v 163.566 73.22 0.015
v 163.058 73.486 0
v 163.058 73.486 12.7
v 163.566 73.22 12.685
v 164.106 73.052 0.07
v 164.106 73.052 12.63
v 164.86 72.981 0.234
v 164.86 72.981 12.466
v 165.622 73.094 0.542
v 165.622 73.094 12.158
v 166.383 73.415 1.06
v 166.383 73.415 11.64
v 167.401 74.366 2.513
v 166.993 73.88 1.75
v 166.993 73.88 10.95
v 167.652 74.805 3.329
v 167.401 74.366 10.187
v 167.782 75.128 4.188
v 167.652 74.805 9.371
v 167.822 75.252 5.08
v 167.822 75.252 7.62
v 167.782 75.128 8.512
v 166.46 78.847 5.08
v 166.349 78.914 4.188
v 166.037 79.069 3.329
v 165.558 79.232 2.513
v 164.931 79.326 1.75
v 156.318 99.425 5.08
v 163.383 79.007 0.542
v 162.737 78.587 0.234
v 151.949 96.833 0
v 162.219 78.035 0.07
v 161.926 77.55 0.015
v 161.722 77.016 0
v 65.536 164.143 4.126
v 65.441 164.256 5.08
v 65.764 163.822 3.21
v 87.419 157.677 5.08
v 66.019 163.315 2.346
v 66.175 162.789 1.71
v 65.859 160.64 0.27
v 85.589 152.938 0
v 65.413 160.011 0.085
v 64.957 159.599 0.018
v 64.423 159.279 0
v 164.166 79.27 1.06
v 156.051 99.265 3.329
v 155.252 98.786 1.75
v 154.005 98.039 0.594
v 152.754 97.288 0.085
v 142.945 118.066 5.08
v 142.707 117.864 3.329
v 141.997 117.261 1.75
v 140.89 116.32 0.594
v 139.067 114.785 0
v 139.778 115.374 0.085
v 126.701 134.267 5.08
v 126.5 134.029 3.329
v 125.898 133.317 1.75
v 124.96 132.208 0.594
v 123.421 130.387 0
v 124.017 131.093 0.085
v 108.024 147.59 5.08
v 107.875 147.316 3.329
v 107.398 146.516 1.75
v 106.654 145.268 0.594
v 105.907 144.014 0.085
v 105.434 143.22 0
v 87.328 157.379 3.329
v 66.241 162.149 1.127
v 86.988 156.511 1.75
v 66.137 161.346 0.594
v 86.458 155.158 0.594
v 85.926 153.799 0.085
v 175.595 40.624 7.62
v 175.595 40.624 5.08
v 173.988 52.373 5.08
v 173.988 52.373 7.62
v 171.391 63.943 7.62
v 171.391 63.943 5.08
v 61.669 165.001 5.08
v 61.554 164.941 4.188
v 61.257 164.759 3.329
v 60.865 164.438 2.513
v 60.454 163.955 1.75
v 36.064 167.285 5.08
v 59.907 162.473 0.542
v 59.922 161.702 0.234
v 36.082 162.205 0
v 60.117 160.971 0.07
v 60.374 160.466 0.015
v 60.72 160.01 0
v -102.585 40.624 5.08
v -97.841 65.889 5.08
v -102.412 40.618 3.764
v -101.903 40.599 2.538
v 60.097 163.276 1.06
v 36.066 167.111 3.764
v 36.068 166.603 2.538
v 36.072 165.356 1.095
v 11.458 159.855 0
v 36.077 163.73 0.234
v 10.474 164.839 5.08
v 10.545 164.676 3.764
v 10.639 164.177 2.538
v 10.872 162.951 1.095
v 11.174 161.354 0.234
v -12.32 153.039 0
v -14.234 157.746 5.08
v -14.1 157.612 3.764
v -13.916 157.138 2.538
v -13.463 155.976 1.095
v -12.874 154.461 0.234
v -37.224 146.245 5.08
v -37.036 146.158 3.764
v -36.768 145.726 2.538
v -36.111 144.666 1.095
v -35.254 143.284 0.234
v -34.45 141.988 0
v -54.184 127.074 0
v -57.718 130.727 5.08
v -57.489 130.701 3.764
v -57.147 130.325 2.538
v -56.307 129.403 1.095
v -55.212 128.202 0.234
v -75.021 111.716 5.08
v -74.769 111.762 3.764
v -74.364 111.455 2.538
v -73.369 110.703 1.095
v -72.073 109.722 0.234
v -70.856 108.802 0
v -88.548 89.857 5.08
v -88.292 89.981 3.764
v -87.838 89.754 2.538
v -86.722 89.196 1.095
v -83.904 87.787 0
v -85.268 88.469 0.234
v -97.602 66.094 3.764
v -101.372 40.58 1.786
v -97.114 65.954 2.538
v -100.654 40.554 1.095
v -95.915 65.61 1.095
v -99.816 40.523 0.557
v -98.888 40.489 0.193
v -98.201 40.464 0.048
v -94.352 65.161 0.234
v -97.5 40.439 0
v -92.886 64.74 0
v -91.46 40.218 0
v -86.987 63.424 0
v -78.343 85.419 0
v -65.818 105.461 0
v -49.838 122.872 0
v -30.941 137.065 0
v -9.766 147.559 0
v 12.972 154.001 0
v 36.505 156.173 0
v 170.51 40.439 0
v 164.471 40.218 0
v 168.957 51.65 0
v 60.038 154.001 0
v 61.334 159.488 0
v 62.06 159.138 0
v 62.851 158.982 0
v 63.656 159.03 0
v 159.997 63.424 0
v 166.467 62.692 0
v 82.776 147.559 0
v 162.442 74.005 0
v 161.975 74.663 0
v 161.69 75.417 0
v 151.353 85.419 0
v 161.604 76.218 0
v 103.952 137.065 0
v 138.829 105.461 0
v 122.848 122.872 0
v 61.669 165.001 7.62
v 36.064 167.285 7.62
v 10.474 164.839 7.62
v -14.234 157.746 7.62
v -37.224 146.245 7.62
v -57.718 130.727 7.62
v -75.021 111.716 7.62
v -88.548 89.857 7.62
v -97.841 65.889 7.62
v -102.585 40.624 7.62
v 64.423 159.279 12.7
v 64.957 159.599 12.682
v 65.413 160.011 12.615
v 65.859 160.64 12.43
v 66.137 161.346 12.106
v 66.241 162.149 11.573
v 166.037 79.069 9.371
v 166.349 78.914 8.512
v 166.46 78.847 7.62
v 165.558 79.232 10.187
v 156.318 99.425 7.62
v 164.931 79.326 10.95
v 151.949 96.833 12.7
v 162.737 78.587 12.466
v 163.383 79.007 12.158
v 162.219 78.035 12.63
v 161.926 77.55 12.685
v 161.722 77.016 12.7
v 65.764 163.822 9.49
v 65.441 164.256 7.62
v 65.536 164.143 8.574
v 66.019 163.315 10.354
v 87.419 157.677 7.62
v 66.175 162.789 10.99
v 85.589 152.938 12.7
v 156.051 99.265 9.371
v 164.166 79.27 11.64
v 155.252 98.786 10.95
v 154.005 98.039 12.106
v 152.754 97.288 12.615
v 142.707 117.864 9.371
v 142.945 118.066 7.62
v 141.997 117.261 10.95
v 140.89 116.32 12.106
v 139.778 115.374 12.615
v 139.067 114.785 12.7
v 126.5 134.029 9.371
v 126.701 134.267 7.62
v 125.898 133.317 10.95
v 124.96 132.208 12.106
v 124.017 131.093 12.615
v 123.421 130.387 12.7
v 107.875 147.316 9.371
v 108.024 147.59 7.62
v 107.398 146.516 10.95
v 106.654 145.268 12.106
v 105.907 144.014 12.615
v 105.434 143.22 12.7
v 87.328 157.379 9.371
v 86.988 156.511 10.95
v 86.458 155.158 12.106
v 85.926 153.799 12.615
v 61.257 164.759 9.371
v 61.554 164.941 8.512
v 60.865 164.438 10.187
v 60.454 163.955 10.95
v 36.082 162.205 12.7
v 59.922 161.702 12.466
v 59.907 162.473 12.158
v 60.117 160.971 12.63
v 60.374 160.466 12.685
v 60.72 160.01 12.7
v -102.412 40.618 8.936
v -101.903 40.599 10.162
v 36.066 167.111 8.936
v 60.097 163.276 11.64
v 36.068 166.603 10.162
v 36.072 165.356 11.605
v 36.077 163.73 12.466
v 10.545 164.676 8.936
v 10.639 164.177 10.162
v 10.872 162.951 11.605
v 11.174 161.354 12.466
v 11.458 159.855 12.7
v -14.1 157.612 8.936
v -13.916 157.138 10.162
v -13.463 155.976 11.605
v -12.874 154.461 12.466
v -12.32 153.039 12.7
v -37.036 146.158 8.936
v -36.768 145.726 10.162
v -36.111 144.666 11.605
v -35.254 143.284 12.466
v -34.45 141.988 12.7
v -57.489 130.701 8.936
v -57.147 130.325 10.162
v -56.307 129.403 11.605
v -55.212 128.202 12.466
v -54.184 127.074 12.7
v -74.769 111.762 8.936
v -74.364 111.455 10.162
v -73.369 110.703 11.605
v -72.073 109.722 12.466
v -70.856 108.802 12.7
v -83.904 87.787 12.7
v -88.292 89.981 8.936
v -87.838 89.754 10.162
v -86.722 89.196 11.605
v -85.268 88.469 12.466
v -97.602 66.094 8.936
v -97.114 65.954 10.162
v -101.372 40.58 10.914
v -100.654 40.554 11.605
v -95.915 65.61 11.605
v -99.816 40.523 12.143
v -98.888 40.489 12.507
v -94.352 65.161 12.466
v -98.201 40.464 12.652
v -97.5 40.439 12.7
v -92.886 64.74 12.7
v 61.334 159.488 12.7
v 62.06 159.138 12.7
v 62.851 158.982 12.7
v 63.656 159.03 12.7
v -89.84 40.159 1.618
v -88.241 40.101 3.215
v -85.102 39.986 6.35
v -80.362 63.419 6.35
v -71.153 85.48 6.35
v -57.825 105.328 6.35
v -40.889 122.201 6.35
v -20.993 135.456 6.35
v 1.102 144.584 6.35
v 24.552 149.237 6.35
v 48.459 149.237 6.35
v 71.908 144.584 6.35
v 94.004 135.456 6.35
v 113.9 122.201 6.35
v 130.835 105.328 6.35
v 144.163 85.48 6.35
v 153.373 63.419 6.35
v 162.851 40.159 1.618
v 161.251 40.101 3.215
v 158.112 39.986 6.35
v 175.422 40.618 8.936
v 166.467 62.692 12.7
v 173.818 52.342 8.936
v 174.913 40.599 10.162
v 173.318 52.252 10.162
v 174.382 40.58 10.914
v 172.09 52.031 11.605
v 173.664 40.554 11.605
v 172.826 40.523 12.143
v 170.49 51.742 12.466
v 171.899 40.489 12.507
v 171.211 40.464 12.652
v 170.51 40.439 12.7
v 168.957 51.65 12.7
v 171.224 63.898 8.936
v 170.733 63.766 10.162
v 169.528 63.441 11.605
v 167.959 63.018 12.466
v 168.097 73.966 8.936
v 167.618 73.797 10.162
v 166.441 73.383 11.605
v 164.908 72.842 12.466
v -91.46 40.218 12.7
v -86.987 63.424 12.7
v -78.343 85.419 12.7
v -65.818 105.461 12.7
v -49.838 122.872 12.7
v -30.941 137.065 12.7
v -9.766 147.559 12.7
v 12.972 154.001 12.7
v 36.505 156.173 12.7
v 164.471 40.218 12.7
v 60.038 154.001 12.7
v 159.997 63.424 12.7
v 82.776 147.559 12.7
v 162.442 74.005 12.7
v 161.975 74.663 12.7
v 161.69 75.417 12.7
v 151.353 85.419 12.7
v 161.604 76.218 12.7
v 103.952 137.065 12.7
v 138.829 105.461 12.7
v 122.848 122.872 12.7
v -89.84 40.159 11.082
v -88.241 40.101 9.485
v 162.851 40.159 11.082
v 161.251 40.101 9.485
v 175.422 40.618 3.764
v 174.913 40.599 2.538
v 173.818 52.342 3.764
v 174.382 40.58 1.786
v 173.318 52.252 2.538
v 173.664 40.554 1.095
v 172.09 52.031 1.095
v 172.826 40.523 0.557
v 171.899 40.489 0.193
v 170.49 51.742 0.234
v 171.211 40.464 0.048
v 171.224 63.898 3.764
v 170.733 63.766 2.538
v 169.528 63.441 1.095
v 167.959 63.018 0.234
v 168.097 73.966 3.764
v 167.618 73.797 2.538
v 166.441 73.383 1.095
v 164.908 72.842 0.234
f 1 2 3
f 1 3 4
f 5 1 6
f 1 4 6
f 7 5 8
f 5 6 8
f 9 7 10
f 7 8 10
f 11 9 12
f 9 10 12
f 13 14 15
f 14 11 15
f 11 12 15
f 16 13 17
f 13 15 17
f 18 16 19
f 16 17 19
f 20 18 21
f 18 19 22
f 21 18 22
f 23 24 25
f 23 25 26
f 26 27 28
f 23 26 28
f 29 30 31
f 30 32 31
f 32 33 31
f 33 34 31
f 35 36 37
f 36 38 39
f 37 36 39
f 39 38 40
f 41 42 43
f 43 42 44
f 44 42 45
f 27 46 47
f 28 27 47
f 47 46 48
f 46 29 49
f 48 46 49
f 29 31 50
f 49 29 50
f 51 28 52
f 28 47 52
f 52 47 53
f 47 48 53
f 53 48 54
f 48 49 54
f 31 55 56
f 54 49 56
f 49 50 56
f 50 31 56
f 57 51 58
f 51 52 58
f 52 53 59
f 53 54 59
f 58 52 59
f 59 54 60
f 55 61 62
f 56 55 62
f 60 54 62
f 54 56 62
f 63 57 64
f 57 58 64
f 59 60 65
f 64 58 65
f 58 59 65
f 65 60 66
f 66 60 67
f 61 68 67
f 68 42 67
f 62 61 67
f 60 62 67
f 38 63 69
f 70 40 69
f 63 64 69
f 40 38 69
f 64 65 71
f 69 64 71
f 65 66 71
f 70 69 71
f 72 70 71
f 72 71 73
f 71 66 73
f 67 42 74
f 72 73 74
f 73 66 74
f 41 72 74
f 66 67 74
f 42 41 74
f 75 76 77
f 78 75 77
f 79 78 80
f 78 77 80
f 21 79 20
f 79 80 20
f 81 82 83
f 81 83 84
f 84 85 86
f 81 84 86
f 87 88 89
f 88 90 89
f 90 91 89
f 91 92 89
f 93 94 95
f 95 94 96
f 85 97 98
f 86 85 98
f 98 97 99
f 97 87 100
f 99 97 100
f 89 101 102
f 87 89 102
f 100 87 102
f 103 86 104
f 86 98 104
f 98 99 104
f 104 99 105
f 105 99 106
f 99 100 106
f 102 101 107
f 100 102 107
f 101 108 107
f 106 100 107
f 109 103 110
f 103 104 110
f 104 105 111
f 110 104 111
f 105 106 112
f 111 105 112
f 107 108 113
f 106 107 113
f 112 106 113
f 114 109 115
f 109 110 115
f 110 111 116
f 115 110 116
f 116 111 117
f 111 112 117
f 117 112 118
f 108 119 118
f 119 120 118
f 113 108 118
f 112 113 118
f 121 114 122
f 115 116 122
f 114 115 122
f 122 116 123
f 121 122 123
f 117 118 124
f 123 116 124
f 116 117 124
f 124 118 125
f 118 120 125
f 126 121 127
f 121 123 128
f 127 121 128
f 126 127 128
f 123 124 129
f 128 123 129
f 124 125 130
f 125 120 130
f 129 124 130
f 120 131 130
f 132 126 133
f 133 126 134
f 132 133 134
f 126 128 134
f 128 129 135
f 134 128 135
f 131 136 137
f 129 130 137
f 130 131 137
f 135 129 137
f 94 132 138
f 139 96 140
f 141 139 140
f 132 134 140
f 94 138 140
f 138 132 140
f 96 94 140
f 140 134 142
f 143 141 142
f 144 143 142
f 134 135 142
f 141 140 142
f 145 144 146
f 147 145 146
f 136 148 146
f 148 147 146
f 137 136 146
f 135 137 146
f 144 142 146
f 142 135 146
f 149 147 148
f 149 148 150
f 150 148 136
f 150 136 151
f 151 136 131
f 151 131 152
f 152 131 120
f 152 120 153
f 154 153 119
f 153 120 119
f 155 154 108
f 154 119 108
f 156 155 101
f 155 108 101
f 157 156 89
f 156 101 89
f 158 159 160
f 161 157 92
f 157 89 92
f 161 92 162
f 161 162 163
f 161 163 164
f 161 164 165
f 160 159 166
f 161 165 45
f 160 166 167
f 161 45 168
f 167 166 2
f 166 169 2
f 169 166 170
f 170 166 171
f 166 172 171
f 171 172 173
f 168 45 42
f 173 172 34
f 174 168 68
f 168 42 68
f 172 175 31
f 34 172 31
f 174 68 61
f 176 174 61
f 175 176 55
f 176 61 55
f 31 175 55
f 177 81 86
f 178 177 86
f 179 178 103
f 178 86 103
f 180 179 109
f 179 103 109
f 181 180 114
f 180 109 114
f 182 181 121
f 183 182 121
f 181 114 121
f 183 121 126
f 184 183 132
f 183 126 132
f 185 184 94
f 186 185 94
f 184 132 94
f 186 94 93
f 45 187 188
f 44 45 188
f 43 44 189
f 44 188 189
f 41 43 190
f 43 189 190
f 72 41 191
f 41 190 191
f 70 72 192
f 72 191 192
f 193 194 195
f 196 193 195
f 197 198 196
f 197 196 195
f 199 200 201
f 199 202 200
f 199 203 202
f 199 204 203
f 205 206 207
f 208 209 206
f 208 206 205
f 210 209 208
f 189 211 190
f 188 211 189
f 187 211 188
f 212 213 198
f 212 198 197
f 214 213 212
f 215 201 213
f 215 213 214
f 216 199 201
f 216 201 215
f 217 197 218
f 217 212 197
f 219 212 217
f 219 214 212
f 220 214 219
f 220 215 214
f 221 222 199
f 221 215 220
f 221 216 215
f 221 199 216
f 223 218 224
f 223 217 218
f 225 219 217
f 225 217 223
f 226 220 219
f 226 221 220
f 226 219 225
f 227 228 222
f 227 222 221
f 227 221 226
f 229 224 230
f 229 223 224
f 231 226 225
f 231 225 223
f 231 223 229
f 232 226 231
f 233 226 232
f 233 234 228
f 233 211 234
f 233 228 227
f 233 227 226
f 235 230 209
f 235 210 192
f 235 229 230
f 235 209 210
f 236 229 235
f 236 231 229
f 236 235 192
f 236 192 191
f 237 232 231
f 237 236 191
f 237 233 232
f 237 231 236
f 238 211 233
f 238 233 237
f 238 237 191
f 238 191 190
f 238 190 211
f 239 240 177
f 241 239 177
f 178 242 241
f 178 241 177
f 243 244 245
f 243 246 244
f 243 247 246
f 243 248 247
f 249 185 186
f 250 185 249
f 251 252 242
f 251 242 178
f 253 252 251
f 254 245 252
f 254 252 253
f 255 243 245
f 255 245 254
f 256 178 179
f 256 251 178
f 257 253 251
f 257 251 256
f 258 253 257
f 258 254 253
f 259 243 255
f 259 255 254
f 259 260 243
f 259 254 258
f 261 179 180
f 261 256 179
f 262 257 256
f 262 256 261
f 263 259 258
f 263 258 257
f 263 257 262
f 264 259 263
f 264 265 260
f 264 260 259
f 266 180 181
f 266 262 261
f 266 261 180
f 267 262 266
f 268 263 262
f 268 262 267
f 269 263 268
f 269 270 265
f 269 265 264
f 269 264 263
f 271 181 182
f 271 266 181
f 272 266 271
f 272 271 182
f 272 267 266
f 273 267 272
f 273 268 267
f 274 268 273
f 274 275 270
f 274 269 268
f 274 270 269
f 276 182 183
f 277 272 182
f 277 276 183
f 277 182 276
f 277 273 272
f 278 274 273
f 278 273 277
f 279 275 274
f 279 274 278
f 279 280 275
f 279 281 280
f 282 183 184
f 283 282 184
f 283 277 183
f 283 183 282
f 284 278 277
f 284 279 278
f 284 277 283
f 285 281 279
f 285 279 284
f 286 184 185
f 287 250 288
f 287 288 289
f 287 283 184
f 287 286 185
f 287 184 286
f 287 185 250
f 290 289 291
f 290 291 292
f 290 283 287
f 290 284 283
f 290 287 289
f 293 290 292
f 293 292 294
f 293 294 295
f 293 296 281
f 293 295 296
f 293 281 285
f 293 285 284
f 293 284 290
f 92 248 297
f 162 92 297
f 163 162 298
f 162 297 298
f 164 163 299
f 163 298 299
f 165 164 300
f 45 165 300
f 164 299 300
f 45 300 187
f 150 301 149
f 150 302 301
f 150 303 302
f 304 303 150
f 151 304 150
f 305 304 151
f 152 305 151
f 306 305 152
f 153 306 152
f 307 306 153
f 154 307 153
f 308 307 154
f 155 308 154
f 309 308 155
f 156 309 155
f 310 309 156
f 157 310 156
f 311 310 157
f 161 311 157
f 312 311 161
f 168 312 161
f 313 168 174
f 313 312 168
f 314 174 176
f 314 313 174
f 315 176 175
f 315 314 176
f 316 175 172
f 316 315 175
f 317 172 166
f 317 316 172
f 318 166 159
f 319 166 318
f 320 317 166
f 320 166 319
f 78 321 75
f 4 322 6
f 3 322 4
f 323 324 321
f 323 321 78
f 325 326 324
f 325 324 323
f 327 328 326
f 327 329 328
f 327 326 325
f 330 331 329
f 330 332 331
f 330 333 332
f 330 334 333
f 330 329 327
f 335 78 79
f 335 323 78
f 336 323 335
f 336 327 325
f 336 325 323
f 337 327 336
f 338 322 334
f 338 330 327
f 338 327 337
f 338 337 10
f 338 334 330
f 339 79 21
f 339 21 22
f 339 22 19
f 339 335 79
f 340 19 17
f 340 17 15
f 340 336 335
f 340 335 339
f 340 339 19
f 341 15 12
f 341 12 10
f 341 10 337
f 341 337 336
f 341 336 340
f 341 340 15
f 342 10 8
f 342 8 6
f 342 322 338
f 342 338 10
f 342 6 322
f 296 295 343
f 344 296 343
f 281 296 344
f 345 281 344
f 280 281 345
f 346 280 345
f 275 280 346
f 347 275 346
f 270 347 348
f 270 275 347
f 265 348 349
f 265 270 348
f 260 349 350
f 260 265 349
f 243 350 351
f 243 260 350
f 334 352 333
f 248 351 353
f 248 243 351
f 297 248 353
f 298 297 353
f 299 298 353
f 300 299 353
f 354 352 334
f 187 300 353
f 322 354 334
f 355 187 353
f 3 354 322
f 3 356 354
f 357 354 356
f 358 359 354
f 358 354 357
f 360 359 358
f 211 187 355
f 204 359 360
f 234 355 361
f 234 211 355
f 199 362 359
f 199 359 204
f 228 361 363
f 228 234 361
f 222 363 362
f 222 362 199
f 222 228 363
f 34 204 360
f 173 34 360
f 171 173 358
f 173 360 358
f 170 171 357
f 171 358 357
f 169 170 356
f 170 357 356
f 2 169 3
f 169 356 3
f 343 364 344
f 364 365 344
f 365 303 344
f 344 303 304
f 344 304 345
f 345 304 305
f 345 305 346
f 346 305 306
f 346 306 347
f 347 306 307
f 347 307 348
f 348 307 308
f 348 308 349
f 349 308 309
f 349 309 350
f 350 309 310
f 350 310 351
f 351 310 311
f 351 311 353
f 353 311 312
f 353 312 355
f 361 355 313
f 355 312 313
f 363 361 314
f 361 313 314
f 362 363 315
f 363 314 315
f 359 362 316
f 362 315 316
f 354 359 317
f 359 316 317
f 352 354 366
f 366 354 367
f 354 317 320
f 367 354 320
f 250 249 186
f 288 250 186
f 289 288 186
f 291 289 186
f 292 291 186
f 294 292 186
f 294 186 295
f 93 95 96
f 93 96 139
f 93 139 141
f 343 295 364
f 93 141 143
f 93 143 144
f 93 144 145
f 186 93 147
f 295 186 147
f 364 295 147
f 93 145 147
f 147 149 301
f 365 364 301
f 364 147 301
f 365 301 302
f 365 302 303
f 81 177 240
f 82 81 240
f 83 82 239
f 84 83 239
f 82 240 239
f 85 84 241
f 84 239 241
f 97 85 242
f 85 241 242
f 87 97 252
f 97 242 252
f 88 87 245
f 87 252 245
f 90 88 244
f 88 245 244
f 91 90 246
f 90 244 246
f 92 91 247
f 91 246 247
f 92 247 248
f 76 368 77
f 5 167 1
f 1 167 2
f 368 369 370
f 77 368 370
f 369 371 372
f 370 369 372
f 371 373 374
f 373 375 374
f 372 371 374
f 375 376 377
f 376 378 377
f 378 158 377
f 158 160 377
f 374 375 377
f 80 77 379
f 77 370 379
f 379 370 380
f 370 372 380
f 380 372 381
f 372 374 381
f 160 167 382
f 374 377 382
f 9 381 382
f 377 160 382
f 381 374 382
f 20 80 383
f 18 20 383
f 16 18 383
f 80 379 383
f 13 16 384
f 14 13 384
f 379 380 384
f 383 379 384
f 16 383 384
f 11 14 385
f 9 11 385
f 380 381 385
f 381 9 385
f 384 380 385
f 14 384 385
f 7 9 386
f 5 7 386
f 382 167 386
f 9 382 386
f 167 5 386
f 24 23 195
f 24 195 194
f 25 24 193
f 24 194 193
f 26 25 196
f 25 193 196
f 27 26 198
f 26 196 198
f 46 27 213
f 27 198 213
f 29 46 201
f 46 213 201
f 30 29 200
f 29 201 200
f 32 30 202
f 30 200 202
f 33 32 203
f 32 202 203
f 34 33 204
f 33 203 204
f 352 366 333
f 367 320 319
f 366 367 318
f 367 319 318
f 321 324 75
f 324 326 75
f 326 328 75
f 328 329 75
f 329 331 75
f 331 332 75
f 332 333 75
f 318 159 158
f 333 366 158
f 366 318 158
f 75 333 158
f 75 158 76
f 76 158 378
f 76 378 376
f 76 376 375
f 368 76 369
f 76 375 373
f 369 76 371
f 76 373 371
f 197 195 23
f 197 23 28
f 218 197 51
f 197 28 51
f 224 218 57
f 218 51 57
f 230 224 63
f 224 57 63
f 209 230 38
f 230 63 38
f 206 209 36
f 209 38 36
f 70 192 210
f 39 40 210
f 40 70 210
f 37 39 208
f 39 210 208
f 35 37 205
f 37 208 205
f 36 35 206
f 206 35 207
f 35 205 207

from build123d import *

# Parameters (mm, degrees)
F1_DEPTH  = 12.7
F2_R      = 5.08
F3_SIZE   = 6.34999
F7_DEPTH  = 25.4
F9_DEPTH  = 25.4
F6_R      = 3.175
F10_DEPTH = 25.4


# Not quite as in the source:
# - a fillet or chamfer is up to 0.001 mm smaller than in the source, because OpenCascade refuses the exact size


with BuildPart() as f1:
    # F0 (on Top) → F1 (new body)
    with BuildSketch(Plane.XY):
        with BuildLine():
            ThreePointArc((-85.1017062912, 39.9863691127), (36.5051433715, 149.8230416662), (158.1119930343, 39.9863691127))
            Line((158.1119930343, 39.9863691127), (175.5953490648, 40.6241259528))
            ThreePointArc((175.5953490648, 40.6241259528), (36.5051433715, 167.2855416662), (-102.5850623217, 40.6241259528))
            Line((-102.5850623217, 40.6241259528), (-85.1017062912, 39.9863691127))
        make_face()
    extrude(amount=F1_DEPTH)

    # F2
    f2_edges = [f1.edges().sort_by_distance(p)[0] for p in [
        (36.505143, 167.285542, 12.7),
        (36.505143, 167.285542, 0),
    ]]
    fillet(f2_edges, radius=F2_R)

    # F3 (size 6.35 in the source; OpenCascade refuses exactly that, so slightly less here)
    f3_edges = [f1.edges().sort_by_distance(p)[0] for p in [
        (36.505143, 149.823042, 12.7),
        (36.505143, 149.823042, 0),
    ]]
    chamfer(f3_edges, length=F3_SIZE)


with BuildPart() as f4_1:
    # F4: instance of F1
    add(f1.part.mirror(Plane.XY))


with BuildPart() as f1_1:
    add(f1.part)

    # F6 (on face) → F7 (cut)
    with BuildSketch(Plane.XY.offset(12.7)):
        with BuildLine():
            ThreePointArc((163.0583931619, 73.4856437086), (162.4024850501, 75.2552779595), (161.7218329639, 77.0155431585))
            ThreePointArc((161.7218329639, 77.0155431585), (161.8086296648, 75.0304207129), (163.0583931619, 73.4856437086))
        make_face()
    extrude(amount=-F7_DEPTH, mode=Mode.SUBTRACT)

    # F8 (on face) → F9 (cut)
    with BuildSketch(Plane.XY.offset(12.7)):
        with BuildLine():
            ThreePointArc((64.4226124591, 159.2789709622), (62.573664155, 159.6574032574), (60.7195923208, 160.0098780326))
            ThreePointArc((60.7195923208, 160.0098780326), (62.4506994343, 159.0344227782), (64.4226124591, 159.2789709622))
        make_face()
        with BuildLine():
            ThreePointArc((64.4226124591, 159.2789709622), (65.7478153328, 160.450521759), (66.2405230377, 162.1493251742))
            ThreePointArc((66.2405230377, 162.1493251742), (61.9182883246, 165.1098112007), (60.7195923208, 160.0098780326))
            ThreePointArc((60.7195923208, 160.0098780326), (62.573664155, 159.6574032574), (64.4226124591, 159.2789709622))
        make_face()
    extrude(amount=-F9_DEPTH, mode=Mode.SUBTRACT)

    # F6 (on face) → F10 (cut)
    with BuildSketch(Plane.XY.offset(12.7)):
        with Locations((164.7779065912, 76.1547069462)):
            Circle(F6_R)
    extrude(amount=-F10_DEPTH, mode=Mode.SUBTRACT)


solid = f1_1.part
